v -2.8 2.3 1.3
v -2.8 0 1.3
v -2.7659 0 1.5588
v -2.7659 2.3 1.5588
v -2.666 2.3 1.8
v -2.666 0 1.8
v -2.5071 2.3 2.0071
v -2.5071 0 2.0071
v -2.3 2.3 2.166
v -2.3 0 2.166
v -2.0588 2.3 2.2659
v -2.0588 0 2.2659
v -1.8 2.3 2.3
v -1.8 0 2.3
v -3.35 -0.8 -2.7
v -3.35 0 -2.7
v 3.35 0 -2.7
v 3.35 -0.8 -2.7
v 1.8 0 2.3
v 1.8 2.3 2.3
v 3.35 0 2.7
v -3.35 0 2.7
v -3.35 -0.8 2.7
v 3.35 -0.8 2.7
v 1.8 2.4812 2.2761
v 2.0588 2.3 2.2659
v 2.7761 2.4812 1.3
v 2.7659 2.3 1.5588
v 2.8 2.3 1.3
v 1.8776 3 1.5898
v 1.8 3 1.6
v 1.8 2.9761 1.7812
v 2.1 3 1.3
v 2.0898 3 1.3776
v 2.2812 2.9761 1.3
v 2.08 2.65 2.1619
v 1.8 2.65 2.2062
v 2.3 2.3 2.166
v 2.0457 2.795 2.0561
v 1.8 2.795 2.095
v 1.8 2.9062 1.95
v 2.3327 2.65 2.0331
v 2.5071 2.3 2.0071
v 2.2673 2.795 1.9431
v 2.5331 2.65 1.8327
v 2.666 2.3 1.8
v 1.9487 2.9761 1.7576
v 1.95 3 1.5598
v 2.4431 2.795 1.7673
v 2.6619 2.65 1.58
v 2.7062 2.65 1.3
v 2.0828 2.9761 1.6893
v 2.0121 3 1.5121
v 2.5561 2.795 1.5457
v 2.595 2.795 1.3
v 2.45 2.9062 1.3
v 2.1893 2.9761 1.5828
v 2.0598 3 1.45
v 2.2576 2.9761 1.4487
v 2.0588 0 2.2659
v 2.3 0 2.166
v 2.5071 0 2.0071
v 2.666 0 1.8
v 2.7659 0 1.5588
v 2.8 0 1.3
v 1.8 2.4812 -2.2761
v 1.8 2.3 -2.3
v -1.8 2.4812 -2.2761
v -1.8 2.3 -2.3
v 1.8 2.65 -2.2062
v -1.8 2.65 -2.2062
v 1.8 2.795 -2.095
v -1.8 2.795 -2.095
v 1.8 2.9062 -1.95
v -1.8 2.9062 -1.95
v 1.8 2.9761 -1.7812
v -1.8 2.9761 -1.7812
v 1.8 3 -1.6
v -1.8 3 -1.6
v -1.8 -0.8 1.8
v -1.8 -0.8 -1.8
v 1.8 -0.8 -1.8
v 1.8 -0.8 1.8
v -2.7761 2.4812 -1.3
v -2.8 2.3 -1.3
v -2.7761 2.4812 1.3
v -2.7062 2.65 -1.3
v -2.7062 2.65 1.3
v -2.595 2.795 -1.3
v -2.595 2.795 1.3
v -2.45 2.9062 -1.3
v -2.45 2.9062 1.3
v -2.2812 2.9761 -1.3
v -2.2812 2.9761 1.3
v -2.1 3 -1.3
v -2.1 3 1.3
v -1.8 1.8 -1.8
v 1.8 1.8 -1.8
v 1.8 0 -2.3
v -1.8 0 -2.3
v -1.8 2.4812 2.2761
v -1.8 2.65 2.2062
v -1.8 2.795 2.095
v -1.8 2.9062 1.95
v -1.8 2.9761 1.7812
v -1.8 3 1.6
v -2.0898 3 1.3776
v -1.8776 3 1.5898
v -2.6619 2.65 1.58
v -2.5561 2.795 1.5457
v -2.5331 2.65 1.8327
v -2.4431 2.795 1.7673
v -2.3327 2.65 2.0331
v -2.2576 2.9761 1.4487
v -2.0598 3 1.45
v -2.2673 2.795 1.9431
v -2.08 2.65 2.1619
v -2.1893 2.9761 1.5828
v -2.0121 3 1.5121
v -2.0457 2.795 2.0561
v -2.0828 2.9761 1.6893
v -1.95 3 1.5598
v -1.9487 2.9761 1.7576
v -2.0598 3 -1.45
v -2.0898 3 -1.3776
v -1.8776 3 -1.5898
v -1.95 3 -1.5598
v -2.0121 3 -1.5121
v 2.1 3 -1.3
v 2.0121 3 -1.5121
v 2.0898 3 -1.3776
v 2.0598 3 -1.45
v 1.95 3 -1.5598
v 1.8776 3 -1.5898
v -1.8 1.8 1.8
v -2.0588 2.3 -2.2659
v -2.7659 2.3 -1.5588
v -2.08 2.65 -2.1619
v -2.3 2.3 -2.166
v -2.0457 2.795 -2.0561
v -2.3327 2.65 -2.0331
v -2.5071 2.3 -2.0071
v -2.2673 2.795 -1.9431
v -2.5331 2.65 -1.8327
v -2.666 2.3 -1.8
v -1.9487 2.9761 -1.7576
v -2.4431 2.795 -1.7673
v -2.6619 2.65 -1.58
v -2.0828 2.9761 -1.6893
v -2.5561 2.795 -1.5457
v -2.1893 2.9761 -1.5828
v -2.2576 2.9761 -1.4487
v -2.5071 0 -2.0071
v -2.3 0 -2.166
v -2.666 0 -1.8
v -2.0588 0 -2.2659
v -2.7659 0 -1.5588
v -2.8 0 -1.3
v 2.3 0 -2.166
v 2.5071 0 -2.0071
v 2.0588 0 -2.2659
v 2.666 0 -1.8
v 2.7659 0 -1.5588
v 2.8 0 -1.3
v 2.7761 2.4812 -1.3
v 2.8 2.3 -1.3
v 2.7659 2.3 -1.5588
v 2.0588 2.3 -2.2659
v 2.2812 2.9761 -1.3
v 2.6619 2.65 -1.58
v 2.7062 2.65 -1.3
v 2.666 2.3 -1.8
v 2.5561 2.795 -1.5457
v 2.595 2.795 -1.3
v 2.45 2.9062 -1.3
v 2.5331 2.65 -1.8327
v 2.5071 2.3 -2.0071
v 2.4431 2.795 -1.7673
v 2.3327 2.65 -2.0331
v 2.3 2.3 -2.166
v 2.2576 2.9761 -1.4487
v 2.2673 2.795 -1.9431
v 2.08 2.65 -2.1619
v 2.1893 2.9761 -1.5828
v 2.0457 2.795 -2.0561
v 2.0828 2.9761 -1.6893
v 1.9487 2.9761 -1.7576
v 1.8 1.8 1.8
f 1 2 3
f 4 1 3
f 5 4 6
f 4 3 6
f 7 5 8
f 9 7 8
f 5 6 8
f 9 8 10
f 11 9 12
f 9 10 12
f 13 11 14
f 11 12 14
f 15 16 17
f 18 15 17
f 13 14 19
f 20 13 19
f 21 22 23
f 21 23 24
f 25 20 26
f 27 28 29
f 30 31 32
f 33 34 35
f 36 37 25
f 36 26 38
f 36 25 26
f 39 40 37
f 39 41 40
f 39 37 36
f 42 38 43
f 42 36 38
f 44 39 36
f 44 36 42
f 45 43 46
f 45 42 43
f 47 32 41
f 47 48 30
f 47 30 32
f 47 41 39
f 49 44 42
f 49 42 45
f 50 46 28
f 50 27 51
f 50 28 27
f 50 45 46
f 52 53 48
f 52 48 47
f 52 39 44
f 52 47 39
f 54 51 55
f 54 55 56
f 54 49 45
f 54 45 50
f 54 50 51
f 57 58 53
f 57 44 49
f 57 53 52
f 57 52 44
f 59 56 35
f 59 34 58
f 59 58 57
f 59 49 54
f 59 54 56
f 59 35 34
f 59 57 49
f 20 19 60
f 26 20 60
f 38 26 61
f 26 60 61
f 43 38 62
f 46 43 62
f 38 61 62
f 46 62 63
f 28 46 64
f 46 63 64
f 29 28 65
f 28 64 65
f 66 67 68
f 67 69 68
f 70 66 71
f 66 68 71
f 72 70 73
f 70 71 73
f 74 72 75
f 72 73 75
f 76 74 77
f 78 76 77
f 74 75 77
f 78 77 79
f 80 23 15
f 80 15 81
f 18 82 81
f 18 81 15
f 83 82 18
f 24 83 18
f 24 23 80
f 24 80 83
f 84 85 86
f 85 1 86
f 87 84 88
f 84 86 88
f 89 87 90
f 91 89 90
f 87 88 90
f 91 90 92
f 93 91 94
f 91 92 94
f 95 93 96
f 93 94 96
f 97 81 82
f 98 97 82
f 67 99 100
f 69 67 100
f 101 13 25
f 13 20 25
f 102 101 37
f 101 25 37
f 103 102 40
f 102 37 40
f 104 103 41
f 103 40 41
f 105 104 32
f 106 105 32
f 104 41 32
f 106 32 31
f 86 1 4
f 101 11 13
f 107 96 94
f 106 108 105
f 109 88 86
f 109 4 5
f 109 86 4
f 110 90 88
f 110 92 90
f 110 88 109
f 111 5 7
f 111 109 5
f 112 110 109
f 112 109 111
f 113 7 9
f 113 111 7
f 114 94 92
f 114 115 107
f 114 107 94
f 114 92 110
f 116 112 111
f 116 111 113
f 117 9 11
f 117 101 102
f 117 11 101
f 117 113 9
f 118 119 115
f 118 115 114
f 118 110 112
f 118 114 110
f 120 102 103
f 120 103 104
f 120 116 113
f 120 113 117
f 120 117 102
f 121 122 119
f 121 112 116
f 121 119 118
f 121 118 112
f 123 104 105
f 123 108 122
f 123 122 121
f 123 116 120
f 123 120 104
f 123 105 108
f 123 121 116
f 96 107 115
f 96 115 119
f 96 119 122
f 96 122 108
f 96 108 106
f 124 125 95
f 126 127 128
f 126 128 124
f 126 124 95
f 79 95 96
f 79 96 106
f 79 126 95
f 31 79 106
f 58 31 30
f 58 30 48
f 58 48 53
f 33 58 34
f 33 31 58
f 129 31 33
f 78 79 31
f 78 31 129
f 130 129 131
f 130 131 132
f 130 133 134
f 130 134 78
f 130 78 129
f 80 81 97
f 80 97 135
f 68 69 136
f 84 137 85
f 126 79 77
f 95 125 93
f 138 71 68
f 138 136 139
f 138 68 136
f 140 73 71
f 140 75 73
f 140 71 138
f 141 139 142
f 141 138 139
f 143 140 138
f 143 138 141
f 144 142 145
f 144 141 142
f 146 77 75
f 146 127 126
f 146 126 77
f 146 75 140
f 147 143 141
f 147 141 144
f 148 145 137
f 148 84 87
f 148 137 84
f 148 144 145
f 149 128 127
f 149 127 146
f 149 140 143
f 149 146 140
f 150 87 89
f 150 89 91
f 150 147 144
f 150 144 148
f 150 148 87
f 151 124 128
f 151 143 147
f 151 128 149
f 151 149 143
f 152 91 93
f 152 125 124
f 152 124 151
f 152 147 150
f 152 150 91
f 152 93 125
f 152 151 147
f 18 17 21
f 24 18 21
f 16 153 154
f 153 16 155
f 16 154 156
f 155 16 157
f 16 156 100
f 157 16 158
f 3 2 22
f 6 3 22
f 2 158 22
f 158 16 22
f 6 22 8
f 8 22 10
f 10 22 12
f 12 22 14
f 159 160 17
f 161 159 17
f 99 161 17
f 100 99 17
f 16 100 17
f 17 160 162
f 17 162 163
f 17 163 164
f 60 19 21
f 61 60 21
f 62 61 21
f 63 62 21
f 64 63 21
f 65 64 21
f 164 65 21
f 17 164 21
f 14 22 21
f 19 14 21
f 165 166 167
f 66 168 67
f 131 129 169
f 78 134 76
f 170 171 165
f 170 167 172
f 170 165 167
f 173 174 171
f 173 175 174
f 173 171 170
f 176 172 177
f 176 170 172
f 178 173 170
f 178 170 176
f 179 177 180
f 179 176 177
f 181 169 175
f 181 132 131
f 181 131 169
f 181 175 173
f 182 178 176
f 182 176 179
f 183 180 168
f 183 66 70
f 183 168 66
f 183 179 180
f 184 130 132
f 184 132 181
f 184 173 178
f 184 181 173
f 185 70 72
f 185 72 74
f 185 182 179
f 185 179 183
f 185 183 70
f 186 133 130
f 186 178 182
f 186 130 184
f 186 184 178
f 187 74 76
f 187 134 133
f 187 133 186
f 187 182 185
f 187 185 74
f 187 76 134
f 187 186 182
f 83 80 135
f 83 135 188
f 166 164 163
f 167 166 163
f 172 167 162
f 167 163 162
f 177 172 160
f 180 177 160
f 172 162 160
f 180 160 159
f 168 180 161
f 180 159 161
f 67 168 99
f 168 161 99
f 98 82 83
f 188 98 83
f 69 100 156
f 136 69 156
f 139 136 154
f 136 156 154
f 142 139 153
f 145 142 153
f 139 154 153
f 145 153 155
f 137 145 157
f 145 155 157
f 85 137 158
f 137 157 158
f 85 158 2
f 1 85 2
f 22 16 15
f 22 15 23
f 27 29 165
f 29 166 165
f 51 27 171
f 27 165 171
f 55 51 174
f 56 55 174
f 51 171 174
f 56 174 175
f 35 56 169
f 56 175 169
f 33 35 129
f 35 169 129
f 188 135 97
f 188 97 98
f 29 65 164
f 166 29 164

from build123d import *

# Parameters (mm, degrees)
EXTRUDE_335_DEPTH     = 3
SKETCH_2_W            = 6.7
SKETCH_2_H            = 5.4
EXTRUDE_569_DEPTH     = 0.8
SKETCH_3_W            = 3.6
SKETCH_3_H            = 3.6
CUT_EXTRUDE_834_DEPTH = 2.6
FILLET_1_R            = 0.7


with BuildPart() as part:
    # 草图1 → Extrude 335 (new body)
    with BuildSketch(Plane(origin=(0, 0, 0), x_dir=(1, 0, 0), z_dir=(0, 1, 0))):
        with BuildLine():
            Line((-1.8, -2.3), (1.8, -2.3))
            ThreePointArc((1.8, -2.3), (2.507106781, -2.007106781), (2.8, -1.3))
            Line((2.8, -1.3), (2.8, 1.3))
            ThreePointArc((2.8, 1.3), (2.507106781, 2.007106781), (1.8, 2.3))
            Line((1.8, 2.3), (-1.8, 2.3))
            ThreePointArc((-1.8, 2.3), (-2.507106781, 2.007106781), (-2.8, 1.3))
            Line((-2.8, 1.3), (-2.8, -1.3))
            ThreePointArc((-2.8, -1.3), (-2.507106781, -2.007106781), (-1.8, -2.3))
        make_face()
    extrude(amount=EXTRUDE_335_DEPTH)

    # 草图2 → Extrude 569 (add)
    with BuildSketch(Plane.XZ):
        Rectangle(SKETCH_2_W, SKETCH_2_H)
    extrude(amount=EXTRUDE_569_DEPTH)

    # 草图3 → Cut-Extrude 834 (cut)
    with BuildSketch(Plane.XZ.offset(0.8)):
        Rectangle(SKETCH_3_W, SKETCH_3_H)
    extrude(amount=-CUT_EXTRUDE_834_DEPTH, mode=Mode.SUBTRACT)

    # 圆角1
    fillet_1_edges = [part.edges().sort_by_distance(p)[0] for p in [
        (2.507106781, 3, -2.007106781),
        (0, 3, -2.3),
        (-2.507106781, 3, -2.007106781),
        (-2.8, 3, 0),
        (-2.507106781, 3, 2.007106781),
        (0, 3, 2.3),
        (2.507106781, 3, 2.007106781),
        (2.8, 3, 0),
    ]]
    fillet(fillet_1_edges, radius=FILLET_1_R)


solid = part.part
